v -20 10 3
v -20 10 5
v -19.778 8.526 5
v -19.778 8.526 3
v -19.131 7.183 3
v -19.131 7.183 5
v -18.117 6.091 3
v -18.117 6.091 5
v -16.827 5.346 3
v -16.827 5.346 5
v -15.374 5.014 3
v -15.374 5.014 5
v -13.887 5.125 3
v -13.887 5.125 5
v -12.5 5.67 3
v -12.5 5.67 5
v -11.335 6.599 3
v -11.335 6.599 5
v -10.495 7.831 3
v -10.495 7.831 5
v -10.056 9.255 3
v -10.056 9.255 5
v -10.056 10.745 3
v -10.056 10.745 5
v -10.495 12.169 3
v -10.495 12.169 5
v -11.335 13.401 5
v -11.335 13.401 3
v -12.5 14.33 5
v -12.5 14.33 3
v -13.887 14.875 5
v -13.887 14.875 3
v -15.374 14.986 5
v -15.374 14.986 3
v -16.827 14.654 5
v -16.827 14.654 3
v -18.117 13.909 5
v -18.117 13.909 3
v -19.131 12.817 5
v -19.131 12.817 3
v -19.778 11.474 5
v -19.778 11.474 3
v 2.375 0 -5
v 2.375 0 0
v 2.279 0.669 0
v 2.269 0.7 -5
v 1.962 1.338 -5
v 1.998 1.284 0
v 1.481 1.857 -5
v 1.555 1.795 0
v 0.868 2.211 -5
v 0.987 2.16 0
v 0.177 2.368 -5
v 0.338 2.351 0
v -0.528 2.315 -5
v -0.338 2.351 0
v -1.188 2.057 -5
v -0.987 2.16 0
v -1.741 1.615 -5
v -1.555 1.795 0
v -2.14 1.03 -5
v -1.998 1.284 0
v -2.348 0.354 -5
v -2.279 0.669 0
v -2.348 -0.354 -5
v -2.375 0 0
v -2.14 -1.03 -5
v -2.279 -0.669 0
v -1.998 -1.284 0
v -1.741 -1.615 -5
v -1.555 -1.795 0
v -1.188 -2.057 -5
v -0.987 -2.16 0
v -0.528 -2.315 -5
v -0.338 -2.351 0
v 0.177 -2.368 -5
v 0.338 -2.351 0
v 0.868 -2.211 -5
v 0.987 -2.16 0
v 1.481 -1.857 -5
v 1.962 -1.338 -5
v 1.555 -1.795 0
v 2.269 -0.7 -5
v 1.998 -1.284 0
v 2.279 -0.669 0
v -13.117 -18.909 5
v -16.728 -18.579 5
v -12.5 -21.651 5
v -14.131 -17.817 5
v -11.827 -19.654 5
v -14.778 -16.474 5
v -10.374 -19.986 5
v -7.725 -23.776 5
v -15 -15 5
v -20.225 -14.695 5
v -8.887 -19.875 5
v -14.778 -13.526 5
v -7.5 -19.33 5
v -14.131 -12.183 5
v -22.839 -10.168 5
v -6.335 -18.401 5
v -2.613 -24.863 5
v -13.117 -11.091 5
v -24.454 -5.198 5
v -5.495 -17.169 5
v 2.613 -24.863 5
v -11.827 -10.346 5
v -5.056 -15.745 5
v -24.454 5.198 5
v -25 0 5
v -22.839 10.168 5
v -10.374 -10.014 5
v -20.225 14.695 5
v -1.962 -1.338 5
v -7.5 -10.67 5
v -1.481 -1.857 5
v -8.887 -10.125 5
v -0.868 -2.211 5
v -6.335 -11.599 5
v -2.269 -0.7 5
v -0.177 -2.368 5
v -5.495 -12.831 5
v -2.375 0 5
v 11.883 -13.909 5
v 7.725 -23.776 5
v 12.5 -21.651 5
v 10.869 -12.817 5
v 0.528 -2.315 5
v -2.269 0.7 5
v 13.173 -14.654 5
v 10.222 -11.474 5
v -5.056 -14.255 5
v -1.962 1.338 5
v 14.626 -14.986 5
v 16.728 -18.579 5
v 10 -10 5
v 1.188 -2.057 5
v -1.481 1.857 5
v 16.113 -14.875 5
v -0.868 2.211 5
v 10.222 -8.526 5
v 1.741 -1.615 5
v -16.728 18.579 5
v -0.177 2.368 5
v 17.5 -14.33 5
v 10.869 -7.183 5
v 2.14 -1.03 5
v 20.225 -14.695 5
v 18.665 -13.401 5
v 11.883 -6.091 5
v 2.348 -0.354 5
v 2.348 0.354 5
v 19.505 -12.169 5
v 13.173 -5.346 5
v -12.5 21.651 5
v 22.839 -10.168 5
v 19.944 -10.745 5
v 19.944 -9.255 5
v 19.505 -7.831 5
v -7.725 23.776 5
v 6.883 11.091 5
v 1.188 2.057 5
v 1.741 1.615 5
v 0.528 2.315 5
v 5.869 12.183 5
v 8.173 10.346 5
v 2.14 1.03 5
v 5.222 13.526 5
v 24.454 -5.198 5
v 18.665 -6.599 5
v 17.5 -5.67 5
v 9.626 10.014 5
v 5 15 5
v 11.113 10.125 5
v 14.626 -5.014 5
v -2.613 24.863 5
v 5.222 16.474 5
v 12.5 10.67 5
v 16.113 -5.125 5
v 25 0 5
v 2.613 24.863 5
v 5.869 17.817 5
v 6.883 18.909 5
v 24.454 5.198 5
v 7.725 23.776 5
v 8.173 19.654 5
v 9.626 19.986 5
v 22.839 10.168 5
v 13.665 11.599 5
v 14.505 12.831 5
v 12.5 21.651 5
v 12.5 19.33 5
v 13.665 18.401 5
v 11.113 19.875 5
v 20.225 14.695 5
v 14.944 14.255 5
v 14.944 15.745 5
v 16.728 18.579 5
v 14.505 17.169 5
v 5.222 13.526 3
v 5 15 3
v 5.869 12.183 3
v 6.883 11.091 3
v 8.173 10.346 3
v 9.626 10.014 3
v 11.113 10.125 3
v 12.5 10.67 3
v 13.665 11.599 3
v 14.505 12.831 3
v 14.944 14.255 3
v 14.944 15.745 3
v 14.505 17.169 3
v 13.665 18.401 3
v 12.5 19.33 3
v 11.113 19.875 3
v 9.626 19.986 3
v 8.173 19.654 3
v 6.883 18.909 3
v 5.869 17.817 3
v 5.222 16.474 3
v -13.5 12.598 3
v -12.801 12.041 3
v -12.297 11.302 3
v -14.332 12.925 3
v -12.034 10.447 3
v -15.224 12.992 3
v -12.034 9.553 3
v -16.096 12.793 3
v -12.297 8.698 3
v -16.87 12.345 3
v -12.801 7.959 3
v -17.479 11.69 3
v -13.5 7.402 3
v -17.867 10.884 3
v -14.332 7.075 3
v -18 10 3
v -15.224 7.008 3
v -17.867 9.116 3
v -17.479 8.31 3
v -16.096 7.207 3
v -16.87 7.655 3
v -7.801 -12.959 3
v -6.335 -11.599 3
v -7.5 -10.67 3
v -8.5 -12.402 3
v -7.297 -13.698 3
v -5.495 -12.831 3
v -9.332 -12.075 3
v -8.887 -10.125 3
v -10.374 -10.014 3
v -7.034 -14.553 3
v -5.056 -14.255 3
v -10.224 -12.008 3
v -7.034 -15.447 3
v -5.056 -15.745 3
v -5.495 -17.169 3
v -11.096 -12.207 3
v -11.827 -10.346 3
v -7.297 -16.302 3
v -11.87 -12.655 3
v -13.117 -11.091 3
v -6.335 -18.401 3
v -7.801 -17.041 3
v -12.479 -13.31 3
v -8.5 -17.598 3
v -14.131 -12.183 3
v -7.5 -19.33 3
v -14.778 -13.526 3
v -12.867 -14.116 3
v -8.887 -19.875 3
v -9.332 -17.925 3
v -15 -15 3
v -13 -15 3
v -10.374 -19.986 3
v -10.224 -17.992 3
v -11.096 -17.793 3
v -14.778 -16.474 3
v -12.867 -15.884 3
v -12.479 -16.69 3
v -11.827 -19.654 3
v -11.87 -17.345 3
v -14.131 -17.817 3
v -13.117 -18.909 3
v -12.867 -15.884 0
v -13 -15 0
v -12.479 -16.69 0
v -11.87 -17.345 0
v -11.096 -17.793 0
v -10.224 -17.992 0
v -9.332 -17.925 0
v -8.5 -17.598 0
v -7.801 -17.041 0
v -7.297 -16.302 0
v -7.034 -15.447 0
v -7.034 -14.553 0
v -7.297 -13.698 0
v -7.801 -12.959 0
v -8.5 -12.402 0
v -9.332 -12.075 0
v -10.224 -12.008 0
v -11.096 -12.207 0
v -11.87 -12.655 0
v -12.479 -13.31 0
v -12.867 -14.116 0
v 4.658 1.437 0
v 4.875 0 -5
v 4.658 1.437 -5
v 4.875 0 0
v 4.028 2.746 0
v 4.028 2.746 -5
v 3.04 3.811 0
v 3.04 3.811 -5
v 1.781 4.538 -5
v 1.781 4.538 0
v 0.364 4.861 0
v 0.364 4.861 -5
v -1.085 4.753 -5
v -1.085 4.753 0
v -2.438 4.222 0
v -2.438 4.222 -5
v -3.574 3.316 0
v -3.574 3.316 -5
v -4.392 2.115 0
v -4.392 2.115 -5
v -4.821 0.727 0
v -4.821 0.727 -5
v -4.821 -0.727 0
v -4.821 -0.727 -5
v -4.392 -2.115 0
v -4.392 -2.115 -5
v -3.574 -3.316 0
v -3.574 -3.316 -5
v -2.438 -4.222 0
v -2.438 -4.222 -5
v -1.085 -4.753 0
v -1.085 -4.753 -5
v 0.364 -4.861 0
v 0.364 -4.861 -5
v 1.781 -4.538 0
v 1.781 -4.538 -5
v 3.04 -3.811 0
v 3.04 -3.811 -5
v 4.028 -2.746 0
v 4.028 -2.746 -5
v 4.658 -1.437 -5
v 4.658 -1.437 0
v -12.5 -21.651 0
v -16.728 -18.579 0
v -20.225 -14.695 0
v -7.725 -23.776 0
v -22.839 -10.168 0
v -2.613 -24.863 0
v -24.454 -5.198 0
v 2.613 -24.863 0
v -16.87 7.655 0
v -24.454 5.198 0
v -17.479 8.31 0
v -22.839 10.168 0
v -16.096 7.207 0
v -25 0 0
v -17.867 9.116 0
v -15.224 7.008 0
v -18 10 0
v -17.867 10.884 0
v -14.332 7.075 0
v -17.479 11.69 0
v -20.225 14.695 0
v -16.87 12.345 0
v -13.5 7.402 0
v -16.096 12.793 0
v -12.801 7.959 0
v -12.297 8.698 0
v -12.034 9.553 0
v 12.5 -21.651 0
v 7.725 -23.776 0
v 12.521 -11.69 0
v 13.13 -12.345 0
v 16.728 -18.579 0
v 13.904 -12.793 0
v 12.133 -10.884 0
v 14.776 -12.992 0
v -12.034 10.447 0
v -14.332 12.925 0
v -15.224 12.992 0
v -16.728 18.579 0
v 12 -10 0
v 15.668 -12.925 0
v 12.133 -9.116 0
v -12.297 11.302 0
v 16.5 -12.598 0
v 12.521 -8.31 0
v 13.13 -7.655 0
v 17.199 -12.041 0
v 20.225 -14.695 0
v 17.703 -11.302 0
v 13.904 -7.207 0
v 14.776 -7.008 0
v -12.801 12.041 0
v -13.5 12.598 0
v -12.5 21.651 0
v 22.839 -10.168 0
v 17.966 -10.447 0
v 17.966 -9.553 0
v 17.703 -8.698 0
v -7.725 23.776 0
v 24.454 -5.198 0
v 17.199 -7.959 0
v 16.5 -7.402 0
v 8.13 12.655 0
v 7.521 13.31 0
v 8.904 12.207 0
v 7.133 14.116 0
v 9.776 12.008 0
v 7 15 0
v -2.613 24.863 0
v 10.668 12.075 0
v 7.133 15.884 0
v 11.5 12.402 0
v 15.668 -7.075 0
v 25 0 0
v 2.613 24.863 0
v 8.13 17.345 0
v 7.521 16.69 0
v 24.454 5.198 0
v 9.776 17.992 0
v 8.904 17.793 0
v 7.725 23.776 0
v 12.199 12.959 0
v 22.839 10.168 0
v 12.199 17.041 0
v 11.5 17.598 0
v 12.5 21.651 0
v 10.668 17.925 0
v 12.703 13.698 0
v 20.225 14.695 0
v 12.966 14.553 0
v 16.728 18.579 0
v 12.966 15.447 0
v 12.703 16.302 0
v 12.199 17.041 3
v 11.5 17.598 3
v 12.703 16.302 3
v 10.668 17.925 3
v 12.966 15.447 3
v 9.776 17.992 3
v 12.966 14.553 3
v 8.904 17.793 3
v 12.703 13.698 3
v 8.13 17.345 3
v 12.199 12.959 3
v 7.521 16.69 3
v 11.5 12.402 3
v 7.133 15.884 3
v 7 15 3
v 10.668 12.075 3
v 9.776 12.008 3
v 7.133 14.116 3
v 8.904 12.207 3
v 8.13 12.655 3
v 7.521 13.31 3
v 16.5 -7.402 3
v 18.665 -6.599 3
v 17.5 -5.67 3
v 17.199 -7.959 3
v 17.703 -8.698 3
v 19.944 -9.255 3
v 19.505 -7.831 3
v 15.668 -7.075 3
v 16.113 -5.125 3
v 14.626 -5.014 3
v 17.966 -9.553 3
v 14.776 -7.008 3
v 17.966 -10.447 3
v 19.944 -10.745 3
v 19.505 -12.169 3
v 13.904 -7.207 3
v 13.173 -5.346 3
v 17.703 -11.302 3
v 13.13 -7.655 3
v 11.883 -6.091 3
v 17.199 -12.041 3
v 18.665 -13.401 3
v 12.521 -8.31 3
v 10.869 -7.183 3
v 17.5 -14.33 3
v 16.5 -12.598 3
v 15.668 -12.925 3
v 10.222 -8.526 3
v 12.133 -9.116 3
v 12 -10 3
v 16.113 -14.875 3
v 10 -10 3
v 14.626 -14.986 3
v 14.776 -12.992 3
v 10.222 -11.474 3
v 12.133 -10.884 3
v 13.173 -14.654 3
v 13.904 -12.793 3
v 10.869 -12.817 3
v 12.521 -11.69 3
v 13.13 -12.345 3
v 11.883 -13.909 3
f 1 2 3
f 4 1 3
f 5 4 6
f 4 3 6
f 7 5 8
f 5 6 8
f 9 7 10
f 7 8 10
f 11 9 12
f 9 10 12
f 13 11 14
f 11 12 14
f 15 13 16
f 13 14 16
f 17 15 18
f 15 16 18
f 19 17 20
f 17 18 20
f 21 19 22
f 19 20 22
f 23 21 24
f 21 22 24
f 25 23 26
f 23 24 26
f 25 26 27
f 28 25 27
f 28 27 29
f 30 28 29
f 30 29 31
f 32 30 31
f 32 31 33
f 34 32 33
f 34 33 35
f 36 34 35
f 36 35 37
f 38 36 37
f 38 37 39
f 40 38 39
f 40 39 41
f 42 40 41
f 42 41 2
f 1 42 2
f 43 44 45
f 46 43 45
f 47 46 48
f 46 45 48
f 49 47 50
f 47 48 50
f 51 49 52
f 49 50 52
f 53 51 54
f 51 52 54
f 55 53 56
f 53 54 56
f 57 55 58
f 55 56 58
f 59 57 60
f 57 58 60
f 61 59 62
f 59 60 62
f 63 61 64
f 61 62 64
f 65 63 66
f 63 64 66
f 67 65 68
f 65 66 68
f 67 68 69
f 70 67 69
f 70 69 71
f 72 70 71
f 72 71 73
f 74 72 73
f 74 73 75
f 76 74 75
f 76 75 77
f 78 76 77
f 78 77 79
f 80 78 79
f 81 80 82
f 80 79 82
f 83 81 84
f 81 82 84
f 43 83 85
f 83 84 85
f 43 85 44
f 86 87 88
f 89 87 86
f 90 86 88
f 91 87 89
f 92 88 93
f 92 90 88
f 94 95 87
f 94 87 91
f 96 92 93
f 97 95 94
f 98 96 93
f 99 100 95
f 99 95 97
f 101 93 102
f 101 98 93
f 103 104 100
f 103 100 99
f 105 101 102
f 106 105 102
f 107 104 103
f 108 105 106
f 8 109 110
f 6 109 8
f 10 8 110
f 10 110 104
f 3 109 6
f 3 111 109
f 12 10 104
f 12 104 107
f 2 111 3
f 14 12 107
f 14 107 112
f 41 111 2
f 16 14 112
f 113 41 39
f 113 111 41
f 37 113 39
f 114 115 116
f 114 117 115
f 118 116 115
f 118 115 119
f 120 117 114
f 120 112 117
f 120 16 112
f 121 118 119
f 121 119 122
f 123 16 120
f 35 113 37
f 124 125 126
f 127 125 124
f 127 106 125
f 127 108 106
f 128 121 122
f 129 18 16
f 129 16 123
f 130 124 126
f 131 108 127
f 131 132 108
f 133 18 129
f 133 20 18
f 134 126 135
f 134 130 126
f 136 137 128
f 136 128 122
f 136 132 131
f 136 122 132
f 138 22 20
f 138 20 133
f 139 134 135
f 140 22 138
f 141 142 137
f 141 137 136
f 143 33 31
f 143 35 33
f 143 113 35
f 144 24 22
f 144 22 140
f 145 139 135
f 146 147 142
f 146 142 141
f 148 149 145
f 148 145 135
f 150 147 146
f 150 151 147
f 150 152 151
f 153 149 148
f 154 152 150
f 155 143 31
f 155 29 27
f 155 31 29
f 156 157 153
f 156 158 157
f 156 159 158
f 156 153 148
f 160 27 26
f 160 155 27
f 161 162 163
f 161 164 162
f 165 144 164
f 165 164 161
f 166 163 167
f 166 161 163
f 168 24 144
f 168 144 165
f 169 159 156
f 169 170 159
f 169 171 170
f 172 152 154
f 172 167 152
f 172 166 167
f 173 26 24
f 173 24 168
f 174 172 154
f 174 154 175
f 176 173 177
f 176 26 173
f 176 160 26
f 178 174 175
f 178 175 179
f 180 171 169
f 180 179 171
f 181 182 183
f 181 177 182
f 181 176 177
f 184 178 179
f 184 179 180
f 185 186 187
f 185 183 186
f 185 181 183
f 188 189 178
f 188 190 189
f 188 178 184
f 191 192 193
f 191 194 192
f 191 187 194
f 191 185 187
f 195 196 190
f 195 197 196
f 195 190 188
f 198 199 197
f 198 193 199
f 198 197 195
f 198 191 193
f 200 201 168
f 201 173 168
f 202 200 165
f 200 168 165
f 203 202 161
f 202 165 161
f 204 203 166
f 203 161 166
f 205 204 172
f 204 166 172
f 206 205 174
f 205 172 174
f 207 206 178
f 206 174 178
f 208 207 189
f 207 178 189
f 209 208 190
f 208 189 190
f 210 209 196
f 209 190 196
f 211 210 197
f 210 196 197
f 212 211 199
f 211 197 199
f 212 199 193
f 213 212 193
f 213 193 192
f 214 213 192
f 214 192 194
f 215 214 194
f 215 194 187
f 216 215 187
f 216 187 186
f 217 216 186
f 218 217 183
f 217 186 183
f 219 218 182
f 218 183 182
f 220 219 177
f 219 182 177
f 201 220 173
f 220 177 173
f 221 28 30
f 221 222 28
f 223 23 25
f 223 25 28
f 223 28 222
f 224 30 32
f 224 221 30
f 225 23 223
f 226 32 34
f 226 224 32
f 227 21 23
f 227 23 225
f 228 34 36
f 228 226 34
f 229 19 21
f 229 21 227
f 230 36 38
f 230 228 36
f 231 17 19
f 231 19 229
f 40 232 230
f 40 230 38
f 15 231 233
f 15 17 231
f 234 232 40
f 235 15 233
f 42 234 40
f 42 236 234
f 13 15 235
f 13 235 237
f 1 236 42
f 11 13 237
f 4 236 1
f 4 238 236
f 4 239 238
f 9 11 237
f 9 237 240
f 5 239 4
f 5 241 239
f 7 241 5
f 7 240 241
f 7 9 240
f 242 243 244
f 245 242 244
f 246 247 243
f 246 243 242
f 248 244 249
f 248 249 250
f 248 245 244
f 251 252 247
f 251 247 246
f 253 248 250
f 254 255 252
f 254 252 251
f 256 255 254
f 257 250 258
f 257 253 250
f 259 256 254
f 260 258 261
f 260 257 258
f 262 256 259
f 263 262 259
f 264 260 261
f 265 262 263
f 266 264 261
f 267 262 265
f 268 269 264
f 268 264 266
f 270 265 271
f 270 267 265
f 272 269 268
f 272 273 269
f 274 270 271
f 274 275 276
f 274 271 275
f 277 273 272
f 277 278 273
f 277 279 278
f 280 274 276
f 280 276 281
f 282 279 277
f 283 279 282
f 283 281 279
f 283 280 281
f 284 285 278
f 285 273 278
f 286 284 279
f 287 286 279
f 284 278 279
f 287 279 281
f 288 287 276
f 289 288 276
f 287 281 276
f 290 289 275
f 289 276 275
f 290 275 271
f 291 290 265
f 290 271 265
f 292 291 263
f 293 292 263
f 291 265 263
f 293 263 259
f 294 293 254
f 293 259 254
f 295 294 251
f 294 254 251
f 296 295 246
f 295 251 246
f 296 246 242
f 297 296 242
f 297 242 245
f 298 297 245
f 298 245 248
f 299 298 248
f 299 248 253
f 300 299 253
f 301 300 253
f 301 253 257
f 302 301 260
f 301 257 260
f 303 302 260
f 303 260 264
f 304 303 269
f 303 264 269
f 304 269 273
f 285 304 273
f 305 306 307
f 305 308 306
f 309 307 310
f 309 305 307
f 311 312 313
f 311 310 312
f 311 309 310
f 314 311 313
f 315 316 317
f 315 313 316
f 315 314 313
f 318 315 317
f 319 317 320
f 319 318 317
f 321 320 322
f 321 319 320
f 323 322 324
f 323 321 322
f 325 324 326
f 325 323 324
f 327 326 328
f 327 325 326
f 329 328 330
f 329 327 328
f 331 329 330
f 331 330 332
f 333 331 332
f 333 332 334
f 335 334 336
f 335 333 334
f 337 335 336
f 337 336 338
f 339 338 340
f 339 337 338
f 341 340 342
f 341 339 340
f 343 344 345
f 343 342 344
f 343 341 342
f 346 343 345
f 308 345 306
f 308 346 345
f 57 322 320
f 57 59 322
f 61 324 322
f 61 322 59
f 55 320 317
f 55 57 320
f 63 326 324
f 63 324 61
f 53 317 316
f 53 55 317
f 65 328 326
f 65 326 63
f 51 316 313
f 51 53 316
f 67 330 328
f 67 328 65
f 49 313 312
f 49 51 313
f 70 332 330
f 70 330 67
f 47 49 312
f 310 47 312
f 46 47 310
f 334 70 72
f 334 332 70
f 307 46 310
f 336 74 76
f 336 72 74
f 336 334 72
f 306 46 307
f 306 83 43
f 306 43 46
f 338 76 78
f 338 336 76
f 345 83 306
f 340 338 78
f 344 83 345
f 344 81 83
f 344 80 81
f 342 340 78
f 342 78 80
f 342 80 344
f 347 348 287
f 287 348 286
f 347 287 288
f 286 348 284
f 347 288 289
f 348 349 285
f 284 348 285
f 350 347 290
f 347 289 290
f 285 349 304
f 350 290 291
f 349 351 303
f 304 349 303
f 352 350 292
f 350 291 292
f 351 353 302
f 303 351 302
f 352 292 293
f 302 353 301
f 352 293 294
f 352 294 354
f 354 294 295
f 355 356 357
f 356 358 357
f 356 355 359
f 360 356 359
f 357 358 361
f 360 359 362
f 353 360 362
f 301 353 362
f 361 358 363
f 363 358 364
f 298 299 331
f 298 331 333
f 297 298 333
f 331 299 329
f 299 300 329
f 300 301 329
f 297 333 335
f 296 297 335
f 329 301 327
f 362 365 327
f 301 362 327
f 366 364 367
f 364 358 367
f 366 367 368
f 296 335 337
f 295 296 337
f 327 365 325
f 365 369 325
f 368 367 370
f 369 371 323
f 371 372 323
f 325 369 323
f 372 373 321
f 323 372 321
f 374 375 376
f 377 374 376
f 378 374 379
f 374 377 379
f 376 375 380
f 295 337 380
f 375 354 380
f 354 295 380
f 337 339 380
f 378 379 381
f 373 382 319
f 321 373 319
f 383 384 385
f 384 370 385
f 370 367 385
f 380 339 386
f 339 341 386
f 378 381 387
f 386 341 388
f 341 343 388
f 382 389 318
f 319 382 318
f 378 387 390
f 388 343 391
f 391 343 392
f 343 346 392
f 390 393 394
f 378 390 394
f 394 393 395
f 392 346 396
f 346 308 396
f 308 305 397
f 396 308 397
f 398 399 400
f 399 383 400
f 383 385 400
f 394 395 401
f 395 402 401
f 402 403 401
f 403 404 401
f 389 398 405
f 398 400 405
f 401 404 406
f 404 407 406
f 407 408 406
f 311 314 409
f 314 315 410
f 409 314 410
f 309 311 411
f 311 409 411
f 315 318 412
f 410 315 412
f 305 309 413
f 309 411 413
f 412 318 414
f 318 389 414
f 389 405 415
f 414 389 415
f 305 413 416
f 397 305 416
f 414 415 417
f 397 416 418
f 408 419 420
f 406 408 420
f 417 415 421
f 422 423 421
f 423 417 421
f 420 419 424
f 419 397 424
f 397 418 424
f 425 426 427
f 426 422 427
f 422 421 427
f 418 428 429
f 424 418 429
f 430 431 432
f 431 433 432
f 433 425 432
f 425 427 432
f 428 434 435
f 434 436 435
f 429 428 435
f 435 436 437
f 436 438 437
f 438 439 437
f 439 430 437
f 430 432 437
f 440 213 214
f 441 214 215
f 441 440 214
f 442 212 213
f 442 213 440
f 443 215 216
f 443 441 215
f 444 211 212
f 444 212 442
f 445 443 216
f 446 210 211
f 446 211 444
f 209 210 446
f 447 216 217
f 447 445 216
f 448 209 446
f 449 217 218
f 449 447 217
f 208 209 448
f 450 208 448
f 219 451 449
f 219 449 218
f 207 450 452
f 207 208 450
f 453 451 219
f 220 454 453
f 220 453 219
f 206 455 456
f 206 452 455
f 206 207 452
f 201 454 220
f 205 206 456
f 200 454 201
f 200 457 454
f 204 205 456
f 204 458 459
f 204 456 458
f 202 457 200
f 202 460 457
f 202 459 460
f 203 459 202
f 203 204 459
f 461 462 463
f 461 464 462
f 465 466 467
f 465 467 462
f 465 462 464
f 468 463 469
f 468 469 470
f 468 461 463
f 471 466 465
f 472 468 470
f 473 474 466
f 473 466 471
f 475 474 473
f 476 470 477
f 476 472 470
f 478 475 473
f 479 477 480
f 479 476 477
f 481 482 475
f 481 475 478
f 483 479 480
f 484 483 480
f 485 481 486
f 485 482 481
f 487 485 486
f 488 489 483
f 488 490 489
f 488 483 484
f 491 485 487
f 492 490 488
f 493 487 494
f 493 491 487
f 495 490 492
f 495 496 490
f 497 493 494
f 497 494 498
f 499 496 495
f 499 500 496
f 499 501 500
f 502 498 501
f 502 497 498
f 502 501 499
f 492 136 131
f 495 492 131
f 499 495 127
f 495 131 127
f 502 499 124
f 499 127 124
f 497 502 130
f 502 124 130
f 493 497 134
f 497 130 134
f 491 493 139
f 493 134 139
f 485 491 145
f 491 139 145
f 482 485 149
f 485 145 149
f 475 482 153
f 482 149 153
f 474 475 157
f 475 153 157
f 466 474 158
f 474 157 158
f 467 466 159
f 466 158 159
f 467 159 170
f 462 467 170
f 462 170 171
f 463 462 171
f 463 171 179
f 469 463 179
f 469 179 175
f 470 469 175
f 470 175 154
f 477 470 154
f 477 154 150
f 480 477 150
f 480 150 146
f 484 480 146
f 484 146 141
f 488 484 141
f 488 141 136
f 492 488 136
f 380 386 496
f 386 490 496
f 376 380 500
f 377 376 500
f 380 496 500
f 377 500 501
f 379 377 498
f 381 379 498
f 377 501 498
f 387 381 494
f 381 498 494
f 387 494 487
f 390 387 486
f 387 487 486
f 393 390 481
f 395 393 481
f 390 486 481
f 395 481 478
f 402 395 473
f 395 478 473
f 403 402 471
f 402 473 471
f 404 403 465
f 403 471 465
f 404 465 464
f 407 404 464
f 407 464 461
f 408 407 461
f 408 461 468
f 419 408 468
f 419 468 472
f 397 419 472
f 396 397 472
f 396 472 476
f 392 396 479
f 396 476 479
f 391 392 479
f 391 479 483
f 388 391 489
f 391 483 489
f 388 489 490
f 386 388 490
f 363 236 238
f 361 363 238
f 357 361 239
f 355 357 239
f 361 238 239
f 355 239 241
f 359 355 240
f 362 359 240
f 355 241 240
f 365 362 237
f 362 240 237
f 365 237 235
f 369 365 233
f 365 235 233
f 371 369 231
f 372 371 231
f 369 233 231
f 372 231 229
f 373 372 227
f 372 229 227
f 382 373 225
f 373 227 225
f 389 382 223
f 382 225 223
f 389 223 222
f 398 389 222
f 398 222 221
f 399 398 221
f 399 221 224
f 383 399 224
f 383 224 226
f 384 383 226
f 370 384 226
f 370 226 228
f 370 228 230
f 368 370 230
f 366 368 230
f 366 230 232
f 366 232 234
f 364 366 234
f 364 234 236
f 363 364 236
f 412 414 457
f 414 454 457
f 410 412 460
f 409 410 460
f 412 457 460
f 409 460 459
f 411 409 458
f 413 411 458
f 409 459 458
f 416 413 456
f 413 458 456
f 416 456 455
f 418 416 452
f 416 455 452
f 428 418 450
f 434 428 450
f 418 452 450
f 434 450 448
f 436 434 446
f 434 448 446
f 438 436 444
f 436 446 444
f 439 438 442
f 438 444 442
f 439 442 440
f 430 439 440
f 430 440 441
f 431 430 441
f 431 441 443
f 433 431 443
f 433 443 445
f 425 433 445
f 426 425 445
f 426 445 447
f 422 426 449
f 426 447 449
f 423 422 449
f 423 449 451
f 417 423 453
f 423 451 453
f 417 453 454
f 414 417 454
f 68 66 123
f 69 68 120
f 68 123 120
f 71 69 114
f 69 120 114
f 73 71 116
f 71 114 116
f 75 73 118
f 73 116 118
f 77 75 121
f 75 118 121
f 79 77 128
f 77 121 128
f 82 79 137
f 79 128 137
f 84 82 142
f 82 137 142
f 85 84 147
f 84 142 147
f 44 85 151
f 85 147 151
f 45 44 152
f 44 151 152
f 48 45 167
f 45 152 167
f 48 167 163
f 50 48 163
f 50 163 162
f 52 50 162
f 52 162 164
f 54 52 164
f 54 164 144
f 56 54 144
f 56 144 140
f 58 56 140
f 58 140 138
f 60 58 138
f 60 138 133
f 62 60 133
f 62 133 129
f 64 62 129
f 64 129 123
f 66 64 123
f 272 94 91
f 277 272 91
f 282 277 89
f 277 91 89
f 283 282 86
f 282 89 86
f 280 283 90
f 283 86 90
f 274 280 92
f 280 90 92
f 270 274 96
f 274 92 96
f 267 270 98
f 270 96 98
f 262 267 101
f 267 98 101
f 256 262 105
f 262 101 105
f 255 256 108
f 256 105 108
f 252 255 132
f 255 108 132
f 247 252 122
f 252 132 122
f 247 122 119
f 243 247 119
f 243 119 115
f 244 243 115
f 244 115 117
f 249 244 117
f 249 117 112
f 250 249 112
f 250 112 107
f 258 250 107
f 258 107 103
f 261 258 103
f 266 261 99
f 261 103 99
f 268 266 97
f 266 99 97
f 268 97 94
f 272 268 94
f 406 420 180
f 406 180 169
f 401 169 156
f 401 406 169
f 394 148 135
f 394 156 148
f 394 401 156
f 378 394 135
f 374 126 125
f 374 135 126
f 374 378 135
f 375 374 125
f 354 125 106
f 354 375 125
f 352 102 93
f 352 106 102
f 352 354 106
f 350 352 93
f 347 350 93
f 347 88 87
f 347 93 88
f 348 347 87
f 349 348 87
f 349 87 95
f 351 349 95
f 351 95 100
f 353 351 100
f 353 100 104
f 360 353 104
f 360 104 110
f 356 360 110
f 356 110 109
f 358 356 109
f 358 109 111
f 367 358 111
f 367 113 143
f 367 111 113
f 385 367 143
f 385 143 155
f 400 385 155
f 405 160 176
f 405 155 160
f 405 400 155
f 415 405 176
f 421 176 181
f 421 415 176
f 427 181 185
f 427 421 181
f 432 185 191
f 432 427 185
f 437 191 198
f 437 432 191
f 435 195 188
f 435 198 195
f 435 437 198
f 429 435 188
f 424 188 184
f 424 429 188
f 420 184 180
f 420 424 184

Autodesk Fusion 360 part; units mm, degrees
sketch "Sketch1" plane through (0, 0, 0) normal (0, 0, 1) x (1, 0, 0)
  circle A0 centre (0, 0) radius 25
  dimension "d1" = 50
extrude "Extrude1" add sketch "Sketch1" along normal blind 5
sketch "Sketch2" plane through (0, 0, 5) normal (0, 0, 1) x (-1, 0, 0)
  circle A0 centre (0, 0) radius 25
  circle A1 centre (15, -10) radius 3
  circle A2 centre (-10, -15) radius 3
  circle A3 centre (-15, 10) radius 3
  circle A4 centre (10, 15) radius 3
  dimension "d4" = 6
  dimension "d5" = 6
  dimension "d6" = 6
  dimension "d7" = 6
extrude "Extrude2" cut sketch "Sketch2" against normal blind 5 contours A1 | A2 | A3 | A4
sketch "Sketch3" plane through (0, 0, 5) normal (0, 0, 1) x (-1, 0, 0)
  circle A0 centre (-10, -15) radius 3
  circle A1 centre (-15, 10) radius 3
  circle A2 centre (15, -10) radius 3
  circle A3 centre (10, 15) radius 3
  circle A4 centre (0, 0) radius 25
  circle A5 centre (15, -10) radius 5
  circle A6 centre (-10, -15) radius 5
  circle A7 centre (-15, 10) radius 5
  circle A8 centre (10, 15) radius 5
  dimension "d10" = 10
  dimension "d11" = 10
  dimension "d12" = 10
  dimension "d13" = 10
extrude "Extrude3" cut sketch "Sketch3" against normal blind 2 contours A5 | A6 | A7 | A8
sketch "Sketch4" plane through (0, 0, 5) normal (0, 0, 1) x (-1, 0, 0)
  circle A0 centre (-10, -15) radius 5
  circle A1 centre (-15, 10) radius 5
  circle A2 centre (15, -10) radius 5
  circle A3 centre (10, 15) radius 5
  circle A4 centre (0, 0) radius 25
  circle A5 centre (0, 0) radius 2.375
  dimension "d16" = 4.75
extrude "Extrude4" cut sketch "Sketch4" against normal blind 21 contours A5
sketch "Sketch7" plane through (0, 0, 0) normal (0, 0, -1) x (1, 0, 0)
  circle A0 centre (0, 0) radius 2.375
  circle A1 centre (10, -15) radius 3
  circle A2 centre (15, 10) radius 3
  circle A3 centre (-15, -10) radius 3
  circle A4 centre (-10, 15) radius 3
  circle A5 centre (0, 0) radius 25
  circle A6 centre (0, 0) radius 4.875
  dimension "d22" = 9.75
extrude "Extrude6" add sketch "Sketch7" along normal blind 5 contours A6
